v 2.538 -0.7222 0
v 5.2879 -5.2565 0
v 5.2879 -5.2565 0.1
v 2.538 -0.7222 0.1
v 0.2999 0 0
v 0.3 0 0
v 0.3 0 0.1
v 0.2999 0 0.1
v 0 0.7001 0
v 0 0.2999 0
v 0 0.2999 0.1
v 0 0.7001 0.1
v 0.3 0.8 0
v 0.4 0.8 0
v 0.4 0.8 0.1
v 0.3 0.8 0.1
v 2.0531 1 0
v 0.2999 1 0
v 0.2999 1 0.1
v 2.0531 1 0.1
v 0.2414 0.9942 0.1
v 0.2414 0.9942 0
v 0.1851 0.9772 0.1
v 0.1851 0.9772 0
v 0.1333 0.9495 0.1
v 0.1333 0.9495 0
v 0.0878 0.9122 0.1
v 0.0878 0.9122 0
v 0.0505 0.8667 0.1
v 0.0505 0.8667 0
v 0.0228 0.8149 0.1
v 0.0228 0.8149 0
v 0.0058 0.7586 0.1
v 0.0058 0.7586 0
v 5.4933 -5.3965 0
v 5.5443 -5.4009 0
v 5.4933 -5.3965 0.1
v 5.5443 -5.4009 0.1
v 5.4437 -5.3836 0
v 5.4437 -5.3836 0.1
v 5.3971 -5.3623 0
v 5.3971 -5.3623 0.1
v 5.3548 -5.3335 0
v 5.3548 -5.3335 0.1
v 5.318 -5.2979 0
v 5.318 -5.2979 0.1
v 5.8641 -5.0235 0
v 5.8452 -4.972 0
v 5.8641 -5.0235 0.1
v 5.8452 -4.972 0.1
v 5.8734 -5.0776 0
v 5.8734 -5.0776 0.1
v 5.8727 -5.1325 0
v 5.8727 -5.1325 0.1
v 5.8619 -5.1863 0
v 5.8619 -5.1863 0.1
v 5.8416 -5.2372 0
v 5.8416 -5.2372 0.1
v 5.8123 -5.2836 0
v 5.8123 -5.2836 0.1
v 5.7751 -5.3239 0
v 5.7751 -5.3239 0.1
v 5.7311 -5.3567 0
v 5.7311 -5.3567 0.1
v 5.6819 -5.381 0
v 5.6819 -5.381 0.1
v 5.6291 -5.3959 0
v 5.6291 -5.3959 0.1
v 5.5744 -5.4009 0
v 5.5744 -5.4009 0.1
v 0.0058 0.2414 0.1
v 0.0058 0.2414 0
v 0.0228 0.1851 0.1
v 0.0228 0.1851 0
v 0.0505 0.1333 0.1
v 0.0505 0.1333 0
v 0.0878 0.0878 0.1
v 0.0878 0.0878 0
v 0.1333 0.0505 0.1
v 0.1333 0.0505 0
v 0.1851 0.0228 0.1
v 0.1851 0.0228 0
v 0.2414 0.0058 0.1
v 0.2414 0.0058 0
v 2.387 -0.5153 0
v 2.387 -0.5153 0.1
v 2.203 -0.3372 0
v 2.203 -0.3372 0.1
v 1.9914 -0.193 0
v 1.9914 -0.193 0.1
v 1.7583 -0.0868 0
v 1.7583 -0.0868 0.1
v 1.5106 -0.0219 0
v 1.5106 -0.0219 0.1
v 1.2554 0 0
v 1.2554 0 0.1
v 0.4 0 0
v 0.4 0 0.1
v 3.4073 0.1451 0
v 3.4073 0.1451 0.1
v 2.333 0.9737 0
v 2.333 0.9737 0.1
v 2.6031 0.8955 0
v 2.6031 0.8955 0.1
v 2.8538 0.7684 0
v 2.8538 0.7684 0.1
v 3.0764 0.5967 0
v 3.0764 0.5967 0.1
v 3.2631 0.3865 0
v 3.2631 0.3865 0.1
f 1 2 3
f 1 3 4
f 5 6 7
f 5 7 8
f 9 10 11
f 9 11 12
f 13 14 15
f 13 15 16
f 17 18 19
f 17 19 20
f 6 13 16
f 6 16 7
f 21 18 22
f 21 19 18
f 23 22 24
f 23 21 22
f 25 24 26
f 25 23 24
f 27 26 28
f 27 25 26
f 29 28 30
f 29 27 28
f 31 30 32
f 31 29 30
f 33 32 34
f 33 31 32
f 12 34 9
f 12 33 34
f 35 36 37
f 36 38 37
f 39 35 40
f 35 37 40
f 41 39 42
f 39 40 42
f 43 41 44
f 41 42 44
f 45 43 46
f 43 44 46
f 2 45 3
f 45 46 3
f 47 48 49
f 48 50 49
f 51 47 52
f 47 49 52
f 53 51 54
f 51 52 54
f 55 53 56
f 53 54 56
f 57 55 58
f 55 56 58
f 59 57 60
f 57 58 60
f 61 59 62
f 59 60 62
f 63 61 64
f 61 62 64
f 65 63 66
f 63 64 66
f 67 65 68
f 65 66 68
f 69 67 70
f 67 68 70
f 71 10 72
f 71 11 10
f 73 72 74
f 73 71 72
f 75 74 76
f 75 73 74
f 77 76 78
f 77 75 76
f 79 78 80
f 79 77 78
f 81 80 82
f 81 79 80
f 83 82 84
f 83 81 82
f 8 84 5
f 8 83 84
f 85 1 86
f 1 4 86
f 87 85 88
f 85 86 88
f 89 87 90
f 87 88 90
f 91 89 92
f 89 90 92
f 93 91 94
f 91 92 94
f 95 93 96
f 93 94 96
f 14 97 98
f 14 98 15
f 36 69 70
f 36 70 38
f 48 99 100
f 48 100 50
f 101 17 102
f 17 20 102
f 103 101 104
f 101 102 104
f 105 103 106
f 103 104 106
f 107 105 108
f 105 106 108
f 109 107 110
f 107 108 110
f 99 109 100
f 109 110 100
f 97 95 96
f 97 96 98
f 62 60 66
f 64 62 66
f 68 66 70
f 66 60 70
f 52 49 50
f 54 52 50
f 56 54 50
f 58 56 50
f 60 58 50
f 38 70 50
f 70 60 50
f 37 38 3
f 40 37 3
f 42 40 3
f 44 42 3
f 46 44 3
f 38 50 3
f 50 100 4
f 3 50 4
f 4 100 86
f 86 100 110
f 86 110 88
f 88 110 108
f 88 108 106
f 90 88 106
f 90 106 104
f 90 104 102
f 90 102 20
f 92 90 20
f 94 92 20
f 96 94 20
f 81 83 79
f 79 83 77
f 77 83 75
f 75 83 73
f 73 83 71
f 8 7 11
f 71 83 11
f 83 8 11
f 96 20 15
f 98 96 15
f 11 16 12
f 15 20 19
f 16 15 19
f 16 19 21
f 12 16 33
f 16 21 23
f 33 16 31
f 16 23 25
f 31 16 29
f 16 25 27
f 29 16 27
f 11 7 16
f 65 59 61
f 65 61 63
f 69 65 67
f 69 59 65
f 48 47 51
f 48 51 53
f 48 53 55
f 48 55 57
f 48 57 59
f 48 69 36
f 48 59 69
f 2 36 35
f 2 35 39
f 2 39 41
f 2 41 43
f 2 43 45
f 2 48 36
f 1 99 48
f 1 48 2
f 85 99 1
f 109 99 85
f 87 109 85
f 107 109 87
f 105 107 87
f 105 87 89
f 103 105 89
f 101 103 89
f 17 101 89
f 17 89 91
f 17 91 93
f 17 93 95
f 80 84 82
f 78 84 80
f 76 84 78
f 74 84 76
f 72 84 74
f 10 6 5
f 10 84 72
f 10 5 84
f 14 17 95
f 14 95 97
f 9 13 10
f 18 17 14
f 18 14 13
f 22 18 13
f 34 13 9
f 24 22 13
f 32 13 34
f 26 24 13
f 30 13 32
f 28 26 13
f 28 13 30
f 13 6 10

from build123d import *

# Parameters (mm, degrees)
BOSS_EXTRUDE1_DEPTH = 0.1
FILLET1_R           = 1.5
FILLET2_R           = 0.3


with BuildPart() as part:
    # Sketch2 → Boss-Extrude1 (new body)
    with BuildSketch(Plane.XY):
        Polygon((0, 0), (0, 1), (3, 1), (6.049495139, -5.400912487), (5.375421316, -5.400912487), (2.1, 0), (0.4, 0), (0.4, 0.8), (0.3, 0.8), (0.3, 0), align=None)
    extrude(amount=BOSS_EXTRUDE1_DEPTH)

    # Fillet1
    fillet1_edges = [part.edges().sort_by_distance(p)[0] for p in [
        (3, 1, 0.05),
        (2.1, 0, 0.05),
    ]]
    fillet(fillet1_edges, radius=FILLET1_R)

    # Fillet2
    fillet2_edges = [part.edges().sort_by_distance(p)[0] for p in [
        (6.049495139, -5.400912487, 0.05),
        (5.375421316, -5.400912487, 0.05),
        (0, 1, 0.05),
        (0, 0, 0.05),
    ]]
    fillet(fillet2_edges, radius=FILLET2_R - 0.0001)  # a hair under: the kernel refuses the full size


solid = part.part
